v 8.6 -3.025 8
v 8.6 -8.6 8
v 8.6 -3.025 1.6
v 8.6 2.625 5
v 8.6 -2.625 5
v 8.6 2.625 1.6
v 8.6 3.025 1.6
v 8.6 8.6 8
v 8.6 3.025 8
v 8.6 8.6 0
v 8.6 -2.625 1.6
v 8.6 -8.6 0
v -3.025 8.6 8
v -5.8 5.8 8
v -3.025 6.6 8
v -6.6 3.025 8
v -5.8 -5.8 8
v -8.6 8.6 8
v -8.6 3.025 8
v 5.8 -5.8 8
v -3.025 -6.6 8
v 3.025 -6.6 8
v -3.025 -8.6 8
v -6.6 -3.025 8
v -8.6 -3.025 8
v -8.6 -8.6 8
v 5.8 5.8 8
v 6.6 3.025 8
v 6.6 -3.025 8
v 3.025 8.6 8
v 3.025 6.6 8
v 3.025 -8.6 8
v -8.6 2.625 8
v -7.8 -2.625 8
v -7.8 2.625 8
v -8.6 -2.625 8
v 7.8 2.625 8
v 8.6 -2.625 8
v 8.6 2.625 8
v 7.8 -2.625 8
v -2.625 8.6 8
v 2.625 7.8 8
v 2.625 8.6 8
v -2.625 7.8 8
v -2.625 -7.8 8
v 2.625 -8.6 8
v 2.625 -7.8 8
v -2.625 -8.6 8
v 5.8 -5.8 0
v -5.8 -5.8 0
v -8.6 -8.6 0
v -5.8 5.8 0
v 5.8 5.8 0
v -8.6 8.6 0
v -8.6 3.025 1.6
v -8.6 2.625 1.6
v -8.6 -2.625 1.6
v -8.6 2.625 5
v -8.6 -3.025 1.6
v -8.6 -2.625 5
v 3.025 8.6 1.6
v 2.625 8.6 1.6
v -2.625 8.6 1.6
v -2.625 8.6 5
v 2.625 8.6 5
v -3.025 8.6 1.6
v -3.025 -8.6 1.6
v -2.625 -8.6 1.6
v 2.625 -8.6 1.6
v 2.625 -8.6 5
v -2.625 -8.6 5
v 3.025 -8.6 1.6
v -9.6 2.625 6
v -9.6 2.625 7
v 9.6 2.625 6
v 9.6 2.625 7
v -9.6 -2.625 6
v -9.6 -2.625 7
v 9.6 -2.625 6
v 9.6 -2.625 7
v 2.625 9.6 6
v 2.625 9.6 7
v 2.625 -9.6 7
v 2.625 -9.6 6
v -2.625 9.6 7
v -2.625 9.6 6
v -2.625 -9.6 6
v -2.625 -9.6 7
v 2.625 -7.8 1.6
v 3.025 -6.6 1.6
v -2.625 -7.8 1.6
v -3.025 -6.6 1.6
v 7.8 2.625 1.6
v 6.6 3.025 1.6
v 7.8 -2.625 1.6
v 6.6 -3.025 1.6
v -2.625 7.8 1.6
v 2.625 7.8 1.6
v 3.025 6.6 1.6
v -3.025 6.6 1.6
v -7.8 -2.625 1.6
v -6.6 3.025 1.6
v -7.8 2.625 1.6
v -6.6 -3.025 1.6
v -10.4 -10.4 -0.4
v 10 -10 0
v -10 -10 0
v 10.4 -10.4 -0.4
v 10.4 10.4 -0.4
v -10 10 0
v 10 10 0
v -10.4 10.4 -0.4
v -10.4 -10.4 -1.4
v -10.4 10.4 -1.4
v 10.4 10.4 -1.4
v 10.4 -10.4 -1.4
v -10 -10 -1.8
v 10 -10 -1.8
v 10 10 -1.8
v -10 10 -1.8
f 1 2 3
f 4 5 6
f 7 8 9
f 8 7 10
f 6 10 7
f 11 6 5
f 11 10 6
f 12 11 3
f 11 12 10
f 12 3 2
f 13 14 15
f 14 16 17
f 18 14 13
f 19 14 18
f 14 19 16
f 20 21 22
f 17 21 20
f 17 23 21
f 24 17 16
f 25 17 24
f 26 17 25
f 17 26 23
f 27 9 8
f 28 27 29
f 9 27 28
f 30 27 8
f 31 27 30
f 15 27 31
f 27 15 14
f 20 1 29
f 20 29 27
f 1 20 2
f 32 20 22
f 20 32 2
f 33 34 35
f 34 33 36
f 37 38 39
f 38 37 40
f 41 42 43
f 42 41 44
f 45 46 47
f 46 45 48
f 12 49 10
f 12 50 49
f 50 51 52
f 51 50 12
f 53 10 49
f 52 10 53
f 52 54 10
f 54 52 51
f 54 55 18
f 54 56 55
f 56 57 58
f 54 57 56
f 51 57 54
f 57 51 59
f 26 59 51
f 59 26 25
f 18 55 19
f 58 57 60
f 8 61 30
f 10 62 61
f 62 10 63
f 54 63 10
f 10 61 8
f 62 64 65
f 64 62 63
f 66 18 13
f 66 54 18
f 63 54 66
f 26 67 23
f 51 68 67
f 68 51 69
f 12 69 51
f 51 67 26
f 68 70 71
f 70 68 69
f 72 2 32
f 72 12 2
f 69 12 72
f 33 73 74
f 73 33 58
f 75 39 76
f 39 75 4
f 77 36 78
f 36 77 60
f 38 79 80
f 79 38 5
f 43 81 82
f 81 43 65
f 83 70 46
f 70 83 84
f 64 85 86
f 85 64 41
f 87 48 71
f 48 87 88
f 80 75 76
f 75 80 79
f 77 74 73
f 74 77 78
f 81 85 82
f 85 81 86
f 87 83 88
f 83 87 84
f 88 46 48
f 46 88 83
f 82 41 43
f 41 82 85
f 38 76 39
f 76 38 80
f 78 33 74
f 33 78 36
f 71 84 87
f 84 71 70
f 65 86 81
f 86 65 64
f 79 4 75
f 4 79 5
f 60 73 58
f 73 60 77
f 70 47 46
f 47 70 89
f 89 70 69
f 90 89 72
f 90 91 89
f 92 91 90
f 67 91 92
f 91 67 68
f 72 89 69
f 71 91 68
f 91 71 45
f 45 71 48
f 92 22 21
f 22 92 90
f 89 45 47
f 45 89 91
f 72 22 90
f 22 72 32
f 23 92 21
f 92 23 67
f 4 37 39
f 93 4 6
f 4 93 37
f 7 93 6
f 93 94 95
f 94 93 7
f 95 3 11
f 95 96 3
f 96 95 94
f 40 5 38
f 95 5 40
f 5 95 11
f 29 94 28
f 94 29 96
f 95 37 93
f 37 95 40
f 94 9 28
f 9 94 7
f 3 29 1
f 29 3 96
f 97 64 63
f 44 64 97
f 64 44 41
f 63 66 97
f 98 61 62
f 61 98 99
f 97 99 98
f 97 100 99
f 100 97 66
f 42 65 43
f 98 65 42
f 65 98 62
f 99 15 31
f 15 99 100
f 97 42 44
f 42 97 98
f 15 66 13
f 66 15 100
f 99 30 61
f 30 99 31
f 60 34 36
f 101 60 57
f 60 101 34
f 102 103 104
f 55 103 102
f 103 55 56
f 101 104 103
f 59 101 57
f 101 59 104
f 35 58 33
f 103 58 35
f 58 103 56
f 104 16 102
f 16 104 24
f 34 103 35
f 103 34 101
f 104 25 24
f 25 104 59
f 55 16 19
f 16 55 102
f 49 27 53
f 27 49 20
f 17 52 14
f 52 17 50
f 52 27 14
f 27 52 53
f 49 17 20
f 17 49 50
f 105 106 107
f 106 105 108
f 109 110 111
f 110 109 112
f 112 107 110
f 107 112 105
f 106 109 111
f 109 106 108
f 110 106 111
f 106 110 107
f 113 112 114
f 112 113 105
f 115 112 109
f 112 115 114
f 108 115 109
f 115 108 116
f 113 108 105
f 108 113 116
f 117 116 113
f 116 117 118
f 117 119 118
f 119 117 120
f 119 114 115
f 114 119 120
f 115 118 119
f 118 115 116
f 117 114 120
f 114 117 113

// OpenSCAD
// file: ../../lib/strings.scad
function contains(list, item, i=0) = (i == len(list))
  ? false
  : list[i] == item || contains(list, item, i+1);

function strcat(char_array, i=0, r="") = (i == len(char_array))
  ? r
  : strcat(char_array, i+1, str(r, char_array[i]));

function substr(s, start=0, limit=undef) =
  // return str[i] where start <= i < limit
  let (end = limit == undef ? len(s)-1 : min(limit-1, len(s)-1))
  end < start
  ? ""
  : strcat([for (i=[start:end]) s[i]]);

function contains_substr(s, sub) =
  // return true if substr is found anywhere in s
  let (list = [for (i=[0:1:len(s)-len(sub)]) substr(s, start=i, limit=i+len(sub))])
  contains(list, sub);

function replace_substr(s, repl, start=0, limit=undef) =
  // remove a substring and replace it with another string
  let (end = limit == undef ? len(s)-1 : limit-1)
  str(substr(s, limit=start), repl, substr(s, start=end+1));

function split(s, separator=" ", parts=[]) =
  let (match=search(separator, s, 0)[0])
  match == []
  ? concat(parts, [s])
  : split(substr(s, start=match[0]+1), separator, concat(parts, [substr(s, limit=match[0])]));

function first(string, char, after=-1) =
  let (result = search(char, substr(string, start=after+1), 1))
  result == []
  ? undef
  : result[0] + after+1;

function last(string, char) =
  let (result=search(char, string, 0))
  result == []
  ? undef
  : result[0][len(result[0])-1];

function _test_strings() =
  assert (contains("abcd", "d") == true)
  assert (contains("abcd", "Q") == false)
  assert (contains([1, 2, 3, 4], 1) == true)
  assert (contains([1, 2, 3, 4], 5) == false)
  assert (contains([["a"], 2, [], ""], []) == true)
  assert (contains([["a"], 2, [], ""], ["a"]) == true)
  assert (contains([["a"], 2, [], ""], ["b"]) == false)
  assert (strcat([]) == "")
  assert (strcat(["a"]) == "a")
  assert (strcat(["a", "b"]) == "ab")
  assert (strcat(["a", "", "b"]) == "ab")
  assert (substr("abcde") == "abcde")
  assert (substr("abcde", start=0) == "abcde")
  assert (substr("abcde", start=1) == "bcde")
  assert (substr("abcde", limit=3) == "abc")
  assert (substr("abcde", start=2, limit=4) == "cd")
  assert (substr("abcde", start=99) == "")
  assert (contains_substr("abcde", "a") == true)
  assert (contains_substr("abcde", "ab") == true)
  assert (contains_substr("abcde", "abcde") == true)
  assert (contains_substr("abcde", "de") == true)
  assert (contains_substr("abcde", "Q") == false)
  assert (contains_substr("abcde", "abcdefghijklmnop") == false)
  assert (contains_substr("abcde", "e*") == false)
  assert (contains_substr("abcde", "") == true)
  assert (replace_substr("abcde", "CD", start=2, limit=4) == "abCDe")
  assert (replace_substr("abcde", "CD", start=2, limit=5) == "abCD")
  assert (replace_substr("abcde", "CD", start=2, limit=999) == "abCD")
  assert (replace_substr("abcde", "CD", start=2) == "abCD")
  assert (replace_substr("abcde", "AAA", start=0) == "AAA")
  assert (replace_substr("abcde", "AAA") == "AAA")
  assert (replace_substr("abcde", "III", limit=0) == "IIIabcde")
  assert (replace_substr("abcde", "III", start=3, limit=3) == "abcIIIde")
  assert (replace_substr("abcde", "III", start=5) == "abcdeIII")
  assert (replace_substr("abcde", "III", start=999) == "abcdeIII")
  assert (split("abc,defg,hi", ",") == ["abc", "defg", "hi"])
  assert (split("abc,defg,hi", "#") == ["abc,defg,hi"])
  assert (split(",,ab,c,,d,efg", ",") == ["", "", "ab", "c", "", "d", "efg"])
  assert (split("a b  cd ") == ["a", "b", "", "cd", ""])
  assert (split("abcd") == ["abcd"])
  assert (first("aaaaa", "a") == 0)
  assert (first("00aaa", "a") == 2)
  assert (first("0000a", "a") == 4)
  assert (first("0000a", "Z") == undef)
  assert (first("aaaaa", "a", after=2) == 3)
  assert (first("aaa00", "a", after=2) == undef)
  assert (first("a000a", "a", after=0) == 4)
  assert (first("a000a", "a", after=99) == undef)
  assert (last("aaaaa", "a") == 4)
  assert (last("aaa00", "a") == 2)
  assert (last("a0000", "a") == 0)
  assert (last("a0000", "Z") == undef)
  "test strings success";

echo(_test_strings());
// file: ../../lib/logic.scad
use <./strings.scad>

function int(s, total=0, i=0) = (i == len(s))
  ? total
  : int(s, total*10 + ord(s[i]) - ord("0"), i+1);

function frac(s) = int(s) / pow(10, len(s));

function num(s) =
  let (parts = split(s, "."))
  len(parts) == 1
  ? int(parts[0])
  : int(parts[0]) + frac(parts[1]);

function any(list, i=0) = (i == len(list))
  ? false
  : list[i] || any(list, i+1);

function all(list, i=0) = (i == len(list))
  ? true
  : list[i] && all(list, i+1);

function is_int_string(s) = all([for(c=s) "0" <= c && c <= "9"]);

function is_num_string(s) =
  let (parts = split(s, "."))
  len(parts) == 1
  ? is_int_string(parts[0])
  : len(parts) == 2
    ? is_int_string(parts[0]) && is_int_string(parts[1])
    : false;

function _test_logic() =
  assert (int("123") == 123)
  assert (int("9999") == 9999)
  assert (frac("5") == 0.5)
  assert (frac("33333") == 0.33333)
  assert (frac("111111") == 0.111111)
  assert (frac("02") == 0.02)
  assert (frac("020000") == 0.02)
  assert (frac("0") == 0)
  assert (frac("0000000000000") == 0)
  assert (frac("0000000000001") == 0.0000000000001)
  assert (num("123") == 123)
  assert (num("2.75") == 2.75)
  assert (num("1234.991230149") == 1234.991230149) // I'm kinda shocked that works
  assert (any([false, "", 0, []]) == false)
  assert (any([false, "", 0, [], 1]) == true)
  assert (any([]) == false)
  assert (all([1, true, "a"]) == true)
  assert (all([1, true, "a", ""]) == false)
  assert (all([]) == true)
  assert (is_int_string("1234") == true)
  assert (is_int_string("093999914") == true)
  assert (is_int_string("123A") == false)
  assert (is_int_string("two") == false)
  assert (is_int_string("2.6") == false)
  assert (is_num_string("2.6") == true)
  assert (is_num_string("1241422.5522106") == true)
  assert (is_num_string("124142205522106") == true)
  assert (is_num_string("1241422,5522106") == false)
  assert (is_num_string("1241422.552.106") == false)
  assert (is_num_string("1241422Q") == false)
  "test logic success";

echo(_test_logic());
// file: ../../lib/shapes.scad
use <./strings.scad>

$fa = $preview ? 1 : .1;
$fs = $preview ? 1 : .1;

// Beginnings of a 3d shapes library. I want shapes with a "margin" property
// and possibly specific overrides for margins in a particular direction.
// The idea is to add a thickness around the outside of the entire shape
// without changing the center of the shape. This can be used with
// `difference` to carve out space for shapes to fit, with adjustable
// tolerance.

// given on="x+,y+" or whatever, figure out the translation vector
function _t(on, x=0, y=0, z=0) = 
  let(t = split(on, ","))
  (contains(t, "x+") ? [ x, 0, 0] : [0, 0, 0]) +
  (contains(t, "x-") ? [-x, 0, 0] : [0, 0, 0]) +
  (contains(t, "y+") ? [0,  y, 0] : [0, 0, 0]) +
  (contains(t, "y-") ? [0, -y, 0] : [0, 0, 0]) +
  (contains(t, "z+") ? [0, 0,  z] : [0, 0, 0]) +
  (contains(t, "z-") ? [0, 0, -z] : [0, 0, 0]);

module prism(
  n=undef,
  r=undef, side=undef, // must specify one of r or side length
  z=undef, // thickness (in z direction)
  on="origin", // placement: origin | x+ | z+,y- | etc
  margin=0,       // global margin
  margin_r=undef, margin_side=undef, // override r margin
  margin_z=undef, // override z margin
  chamfer=0,
) {
  a = 180/n;
  margin_side = margin_side == undef ? margin : margin_side;
  margin_r = margin_r == undef ? margin_side/cos(a) : margin_r;
  margin_z = margin_z == undef ? margin : margin_z;
  r = r == undef ? side/(2*sin(a)) : r;
  translate(_t(on, y=r*cos(a), z=z/2))
    rotate([0, 0, 90 - (n%2 == 0 ? a : 0)])
      if (chamfer > 0) {
        // chamfer should be measured in distance perpendicular to the side, which is at
        // angle `a` from `r` (i.e. the same angle we have to rotate if n is odd.
        cz = chamfer;
        cr = chamfer/cos(a);
        // TODO chamfer should depend on the margin, but it's pretty tedious
        // for a small gain
        translate([0, 0, (z + 2*margin_z - cz)/2])
          cylinder(h=cz, r1=r + margin_r, r2=r + margin_r - cr, $fn=n, center=true);
        cylinder(h=z + 2*margin_z - 2*cz, r=r + margin_r, $fn=n, center=true);
        translate([0, 0, -(z + 2*margin_z - cz)/2])
          cylinder(h=cz, r2=r + margin_r, r1=r + margin_r - cr, $fn=n, center=true);
      } else {
        cylinder(h=z + 2*margin_z, r=r + margin_r, $fn=n, center=true);
      }
}



//difference() {
//  %prism(n=5, r=8, z=4, chamfer=1, on="y+,z-", margin=1);
//  prism(n=5, r=8, z=4, chamfer=1, on="y+,z-");
//}

module box(
  x=undef, y=undef, z=undef,  // 3 ways to specify size
  on="origin", // placement: origin | x+ | z+,y- | etc
  margin=0, // global margin
  margin_x=undef,  // override margins
  margin_y=undef,
  margin_z=undef,
  chamfer=0, // flatten the corners
) {
  s = is_num(z)  ? [x, y, z]  // size: x=num, y=num, z=num
    : is_list(x) ? x          //   or: x=[num, num, num]
    : [x, x, x];              //   or: x=num
  m = [
    margin_x == undef ? margin : margin_x,
    margin_y == undef ? margin : margin_y,
    margin_z == undef ? margin : margin_z
  ];

  translate(_t(on, x=s.x/2, y=s.y/2, z=s.z/2))
    if (chamfer > 0) {
      // This looks pretty wild, but I just want to maintain a minimum margin
      // in each of the specified directions from the chamfer, so to keep the
      // chamfer angles all at 45, you need take the smallest chamfer out of
      // the big shape (box + margins) that maintains the right margin
      // distance in each direction.
      cyz = 2*(min(m.y, m.z) + chamfer);
      cxz = 2*(min(m.x, m.z) + chamfer);
      cxy = 2*(min(m.x, m.y) + chamfer);
      intersection() {
        cube(s + 2*m, center=true);
        rotate([45,0,0])
          cube([
            s.x + 2*m.x + 1,
            (s.y + 2*m.y + s.z + 2*m.z - cyz)/sqrt(2),
            (s.y + 2*m.y + s.z + 2*m.z - cyz)/sqrt(2)
          ], center=true);
        rotate([0,45,0])
          cube([
            (s.x + 2*m.x + s.z + 2*m.z - cxz)/sqrt(2),
            s.y + 2*m.y + 1,
            (s.x + 2*m.x + s.z + 2*m.z - cxz)/sqrt(2)
          ], center=true);
        rotate([0,0,45])
          cube([
            (s.x + 2*m.x + s.y + 2*m.y - cxy)/sqrt(2),
            (s.x + 2*m.x + s.y + 2*m.y - cxy)/sqrt(2),
            s.z + 2*m.z + 1
          ], center=true);
      }
    } else {
      cube(s + 2*m, center=true);
    }
}

//difference() {
//  box(10, 20, 30, chamfer=4, margin=1, margin_x=2);
//  box(10, 20, 30, chamfer=4);
//  // see through to the chamfer on different margins
//  color("red") box(100, on="z+");
//}

//box(1, chamfer=.1, on="z+,x-");
//%box(x=10, y=10, z=.1, on="z+,x-");
// file: ../../lib/props.scad
use <./logic.scad>
use <./strings.scad>

// Global prop function.
// The idea here is to define a function like:
//   function prop(key) = getprop(key, global_props);
// and then use that to share variables throughout your multi-file design.
// A bunch of expressions are available within the props dictionary, like
// references to other props, and various computations. Whitespace
// is strict in the expressions.
props_example = [
  ["key1", 1],
  ["key2", 2],
  ["key3", 3],
  ["key4", "$key3 * 20"],
  ["namespace.value1", 8],
  ["namespace.value2", "$key2"],
  ["othernamespace.value1", "$namespace.value2"],
  ["s", "hello"],
  ["e1", "$key3 / 2"],
  ["e2", "$namespace.value2 + 1.275"],
  ["e3", "$othernamespace.value1 * 6"],
  ["e4", "$key2 ^ 6"],
  ["e5", "$key3 % 2"],
  ["e6", "cos $key4"],
  ["p1", "$key3 * ($key2 + $key1)"],
  ["p2", "(1 + 2) * (2 ^ 3)"],
  ["p3", "((1 + $e5) + 1) + (cos $key4)"],
  ["zero", 0],
  ["false", false],
  ["undef", undef],
  ["empty-array", []],
];

function eval_literal(args) =
  // compute things like `2 + 4` or `cos 45`
  len(args) == 0 ? undef :
  args[0] == "norm" ? norm([for(i=[1:len(args)-1]) args[i]]) :
  len(args) == 3
  ? args[1] == "/" ? args[0] / args[2]
    : args[1] == "*" ? args[0] * args[2]
    : args[1] == "+" ? args[0] + args[2]
    : args[1] == "-" ? args[0] - args[2]
    : args[1] == "^" ? args[0] ^ args[2]
    : args[1] == "%" ? args[0] % args[2]
    : undef
  : len(args) == 2
    ? args[0] == "sin" ? sin(args[1])
      : args[0] == "cos" ? cos(args[1])
      : args[0] == "tan" ? tan(args[1])
      : args[0] == "asin" ? asin(args[1])
      : args[0] == "acos" ? acos(args[1])
      : args[0] == "atan" ? atan(args[1])
      : args[0] == "sqrt" ? sqrt(args[1])
      : undef
    : len(args) == 1
      ? args[0]
      : undef;

function eval_raw(expression, props) =
  // resolve types and props in expressions, like "(cos $thing) * ($other / 3)"
  // note that whitespace is not ignored
  !is_string(expression)
  ? expression
  : !contains(expression, "(")
    ? // simple expression like "$thing + 5"
      eval_literal([
        for (arg=split(expression))
          arg[0] == "$"
          ? getprop(substr(arg, start=1), props)
          : is_num_string(arg)
            ? num(arg)
            : arg
      ])
    : // resolve the innermost parens and start again
      let (inner_start = last(expression, "("),
           inner_end = first(expression, ")", after=inner_start),
           inner = eval_raw(substr(expression, inner_start+1, inner_end), props))
      eval_raw(replace_substr(expression, inner, inner_start, inner_end+1), props);

function getprop(key, props) =
  let (prop = props[search([key], props)[0]][1])
  assert (prop != undef, str("Missing key in properties: ", key))
  let (result = eval_raw(prop, props))
  assert (result != undef, str("Invalid expression in properties: ", prop))
  result;

function _test_props() =
  assert (getprop("key3", props_example) == 3)
  assert (getprop("namespace.value2", props_example) == 2)
  assert (getprop("e1", props_example) == 1.5)
  assert (getprop("e2", props_example) == 3.275)
  assert (getprop("e3", props_example) == 12)
  assert (getprop("e4", props_example) == 64)
  assert (getprop("e5", props_example) == 1)
  assert (getprop("e6", props_example) == 0.5)
  assert (getprop("p1", props_example) == 9)
  assert (getprop("p2", props_example) == 24)
  assert (getprop("p3", props_example) == 3.5)
  assert (getprop("s", props_example) == "hello")
  assert (getprop("zero", props_example) == 0)
  assert (getprop("false", props_example) == false)
  assert (getprop("empty-array", props_example) == [])
  "test props success";

echo(_test_props());
// main file
use <../../lib/props.scad>
use <../../lib/shapes.scad>
$fa = $preview ? 1 : .1;
$fs = $preview ? 1 : .1;
big = 99;

prop_map = [
  // main parameters
  ["socket.width", 21],
  ["socket.depth", 8],
  ["socket.wall.thick", 1.8],
  ["socket.wall.thin", 0.8],
  ["socket.wall.ratio", 0.75], // higher=taller thick wall
  ["tolerance", 0.1],

  // computed values
  ["socket.wall.chamfer", "$socket.wall.thick - $socket.wall.thin"],
  ["plug.width", "$socket.width - (2 * ($socket.wall.thick + $tolerance))"],
  ["plug.depth", "$socket.depth"],
  ["plug.base.width", "$socket.width - (2 * ($socket.wall.thick + $tolerance))"],
  ["plug.top.width",  "$socket.width - (2 * ($socket.wall.thin + $tolerance))"],
  ["plug.tab.width", "$socket.width / 4"],
  ["plug.tab.chamfer", "$socket.wall.chamfer"], // same as the chamfer on the bottom
];

function prop(key) = getprop(key, prop_map);

// Single wall board piece, with n sides. Outside wall is size `width`.
// Using n !=4 is experimental, but looks possible with triangles or
// of course hexagons!
// TODO/known issue: these values kinda depend on each other, so they're not
// quite parameters to the function...
module socket(
  n=4,
  width=prop("socket.width"),
  depth=prop("socket.depth"),
  thick_wall=prop("socket.wall.thick"),
  thin_wall=prop("socket.wall.thin"),
  wall_ratio=prop("socket.wall.ratio"),
  chamfer=prop("socket.wall.chamfer"),
  margin=0,
) {
  render() difference() {
    // full block
    prism(n, side=width, z=depth, on="z+", margin=margin);

    // hole for the thick walls
    prism(n, side=width-2*thick_wall, z=big, margin=-margin);

    // chamfer to the thin wall. Note: margin_z is ignored here
    // for a tight fit in the "depth" direction
    translate([0, 0, depth*wall_ratio - chamfer])
      prism(n, side=width-2*thin_wall, z=big, on="z+", chamfer=chamfer,
           margin_side=-margin);
    }
}

module _plug_tabs() {
  depth=prop("plug.depth");
  width=prop("socket.width");
  plug_base_width=prop("plug.base.width");
  plug_top_width=prop("plug.top.width");
  tab_width=prop("plug.tab.width");
  chamfer=prop("plug.tab.chamfer");
  tolerance=prop("tolerance");
  
  render() difference() {
    intersection() {
      // box with tab sections sticking out
      union() {
        box(x=plug_base_width, y=plug_base_width, z=depth, on="z+");
        box(x=width, y=tab_width, z=depth, on="z+");
        box(x=tab_width, y=width, z=depth, on="z+");
      }
      // chamfer the top of the tabs
      box(x=plug_top_width, y=plug_top_width, z=depth, on="z+", chamfer=chamfer);
    }
    // shape/chamfer the bottom of the tabs to fit the socket
    socket(margin=tolerance);
    
    // cut around the thin tab walls
    gap = 1.2;
    wall = 0.8;
    thin_gap = 0.4;
    length = depth*.8;
    for (a=[0:90:270]) rotate([0, 0, a]) {
      translate([0, -plug_base_width/2 + wall, depth])
        box(x=tab_width, y=gap, z=length, on="z-,y+");
      translate([tab_width/2, -plug_base_width/2, depth])
        box(x=thin_gap, y=gap+wall, z=length, on="z-,x+,y+");
      translate([-tab_width/2, -plug_base_width/2, depth])
        box(x=thin_gap, y=gap+wall, z=length, on="z-,x-,y+");
    }
    
    // cut a chunk out of the middle block
    mid = plug_base_width - 4*wall - 2*gap;
    box(mid, on="z+");
  }
  
  // face plate
  prism(n=4, side=width, z=1.8, on="z-", chamfer=.4, margin_side=-.1);
//  box(x=width, y=width, z=1.8, on="z-", chamfer=.4);
}

_plug_tabs();

module _plug_block(
  width=prop("plug.width"),
  depth=prop("plug.depth"),
  tab_width=prop("plug.tab.width"),
  tab_size=prop("plug.tab.size"),
  tolerance=prop("tolerance"),
) {
//  plug_width = width - 2*(thick_wall + tolerance);
//  plug_top_width = width - 2*(thin_wall + tolerance);
//  plate_width = width - 2*tolerance;
//  tab_width = plug_width / 4;
  render()
    // main block with tabs
    difference() {
      union() {
        box(x=width, y=width, z=depth, on="z+");
        box(x=tab_width, y=tab_size, z=depth, on="z+");
        box(x=tab_size, y=tab_width, z=depth, on="z+");
      }
      socket(margin=tolerance);
    }

  // front plate
//  box(x=plate_width, y=plate_width, z=thick_wall, on="z-", chamfer=thick_wall/4);
}



/*
module plugv2(
  width=prop("width"),
  depth=prop("depth"),
  thick_wall=prop("thick_wall"),
  thin_wall=prop("thin_wall"),
  tolerance=0.15,
) {
  plug_width = width - 2*(thick_wall + tolerance);

  hole_depth = depth/4 + thick_wall - thin_wall;
  hole_length = plug_width * 0.7;
  hole_width = thin_wall;
  hole_t = (hole_width*3 - plug_width)/2;

  // holes to let the tabs flex inward
  render()
  difference() {
    _plug_block(tolerance=tolerance);

    // vertical gap
    translate([0, hole_t, depth])
      box(x=hole_length, y=hole_width, z=hole_depth, on="z-");
    // horiontal gap
    translate([0, hole_t-hole_width/2, depth-hole_depth])
      box(x=hole_length, y=2*hole_width, z=hole_width, on="z-");

    translate([0, -hole_t, depth])
      box(x=hole_length, y=hole_width, z=hole_depth, on="z-");
    translate([0, -hole_t+hole_width/2, depth-hole_depth])
      box(x=hole_length, y=2*hole_width, z=hole_width, on="z-");

    translate([hole_t, 0, depth])
      box(x=hole_width, y=hole_length, z=hole_depth, on="z-");
    translate([hole_t-hole_width/2, 0, depth-hole_depth])
      box(y=hole_length, x=2*hole_width, z=hole_width, on="z-");

    translate([-hole_t, 0, depth])
      box(x=hole_width, y=hole_length, z=hole_depth, on="z-");
    translate([-hole_t+hole_width/2, 0, depth-hole_depth])
      box(y=hole_length, x=2*hole_width, z=hole_width, on="z-");
  }
}

module plugv3(
  width=prop("width"),
  depth=prop("depth"),
  thick_wall=prop("thick_wall"),
  thin_wall=prop("thin_wall"),
  tolerance=0.1,
) {
  plug_width = width - 2*(thick_wall + tolerance);

  hole_depth = depth*3/4;
  hole_length = plug_width * 0.7;
  hole_width = thin_wall;
  hole_t = (hole_width*3 - plug_width)/2;

  // holes to let the tabs flex inward
  render()
  difference() {
    _plug_block(tolerance=tolerance);

    // vertical gap
    translate([0, hole_t, depth])
      box(x=hole_length, y=hole_width, z=hole_depth, on="z-");
    // horiontal gap
    translate([0, hole_t-hole_width/2, depth-hole_depth])
      box(x=hole_length, y=2*hole_width, z=hole_width, on="z-");

    translate([0, -hole_t, depth])
      box(x=hole_length, y=hole_width, z=hole_depth, on="z-");
    translate([0, -hole_t+hole_width/2, depth-hole_depth])
      box(x=hole_length, y=2*hole_width, z=hole_width, on="z-");

    translate([hole_t, 0, depth])
      box(x=hole_width, y=hole_length, z=hole_depth, on="z-");
    translate([hole_t-hole_width/2, 0, depth-hole_depth])
      box(y=hole_length, x=2*hole_width, z=hole_width, on="z-");

    translate([-hole_t, 0, depth])
      box(x=hole_width, y=hole_length, z=hole_depth, on="z-");
    translate([-hole_t+hole_width/2, 0, depth-hole_depth])
      box(y=hole_length, x=2*hole_width, z=hole_width, on="z-");
  }
}
*/
